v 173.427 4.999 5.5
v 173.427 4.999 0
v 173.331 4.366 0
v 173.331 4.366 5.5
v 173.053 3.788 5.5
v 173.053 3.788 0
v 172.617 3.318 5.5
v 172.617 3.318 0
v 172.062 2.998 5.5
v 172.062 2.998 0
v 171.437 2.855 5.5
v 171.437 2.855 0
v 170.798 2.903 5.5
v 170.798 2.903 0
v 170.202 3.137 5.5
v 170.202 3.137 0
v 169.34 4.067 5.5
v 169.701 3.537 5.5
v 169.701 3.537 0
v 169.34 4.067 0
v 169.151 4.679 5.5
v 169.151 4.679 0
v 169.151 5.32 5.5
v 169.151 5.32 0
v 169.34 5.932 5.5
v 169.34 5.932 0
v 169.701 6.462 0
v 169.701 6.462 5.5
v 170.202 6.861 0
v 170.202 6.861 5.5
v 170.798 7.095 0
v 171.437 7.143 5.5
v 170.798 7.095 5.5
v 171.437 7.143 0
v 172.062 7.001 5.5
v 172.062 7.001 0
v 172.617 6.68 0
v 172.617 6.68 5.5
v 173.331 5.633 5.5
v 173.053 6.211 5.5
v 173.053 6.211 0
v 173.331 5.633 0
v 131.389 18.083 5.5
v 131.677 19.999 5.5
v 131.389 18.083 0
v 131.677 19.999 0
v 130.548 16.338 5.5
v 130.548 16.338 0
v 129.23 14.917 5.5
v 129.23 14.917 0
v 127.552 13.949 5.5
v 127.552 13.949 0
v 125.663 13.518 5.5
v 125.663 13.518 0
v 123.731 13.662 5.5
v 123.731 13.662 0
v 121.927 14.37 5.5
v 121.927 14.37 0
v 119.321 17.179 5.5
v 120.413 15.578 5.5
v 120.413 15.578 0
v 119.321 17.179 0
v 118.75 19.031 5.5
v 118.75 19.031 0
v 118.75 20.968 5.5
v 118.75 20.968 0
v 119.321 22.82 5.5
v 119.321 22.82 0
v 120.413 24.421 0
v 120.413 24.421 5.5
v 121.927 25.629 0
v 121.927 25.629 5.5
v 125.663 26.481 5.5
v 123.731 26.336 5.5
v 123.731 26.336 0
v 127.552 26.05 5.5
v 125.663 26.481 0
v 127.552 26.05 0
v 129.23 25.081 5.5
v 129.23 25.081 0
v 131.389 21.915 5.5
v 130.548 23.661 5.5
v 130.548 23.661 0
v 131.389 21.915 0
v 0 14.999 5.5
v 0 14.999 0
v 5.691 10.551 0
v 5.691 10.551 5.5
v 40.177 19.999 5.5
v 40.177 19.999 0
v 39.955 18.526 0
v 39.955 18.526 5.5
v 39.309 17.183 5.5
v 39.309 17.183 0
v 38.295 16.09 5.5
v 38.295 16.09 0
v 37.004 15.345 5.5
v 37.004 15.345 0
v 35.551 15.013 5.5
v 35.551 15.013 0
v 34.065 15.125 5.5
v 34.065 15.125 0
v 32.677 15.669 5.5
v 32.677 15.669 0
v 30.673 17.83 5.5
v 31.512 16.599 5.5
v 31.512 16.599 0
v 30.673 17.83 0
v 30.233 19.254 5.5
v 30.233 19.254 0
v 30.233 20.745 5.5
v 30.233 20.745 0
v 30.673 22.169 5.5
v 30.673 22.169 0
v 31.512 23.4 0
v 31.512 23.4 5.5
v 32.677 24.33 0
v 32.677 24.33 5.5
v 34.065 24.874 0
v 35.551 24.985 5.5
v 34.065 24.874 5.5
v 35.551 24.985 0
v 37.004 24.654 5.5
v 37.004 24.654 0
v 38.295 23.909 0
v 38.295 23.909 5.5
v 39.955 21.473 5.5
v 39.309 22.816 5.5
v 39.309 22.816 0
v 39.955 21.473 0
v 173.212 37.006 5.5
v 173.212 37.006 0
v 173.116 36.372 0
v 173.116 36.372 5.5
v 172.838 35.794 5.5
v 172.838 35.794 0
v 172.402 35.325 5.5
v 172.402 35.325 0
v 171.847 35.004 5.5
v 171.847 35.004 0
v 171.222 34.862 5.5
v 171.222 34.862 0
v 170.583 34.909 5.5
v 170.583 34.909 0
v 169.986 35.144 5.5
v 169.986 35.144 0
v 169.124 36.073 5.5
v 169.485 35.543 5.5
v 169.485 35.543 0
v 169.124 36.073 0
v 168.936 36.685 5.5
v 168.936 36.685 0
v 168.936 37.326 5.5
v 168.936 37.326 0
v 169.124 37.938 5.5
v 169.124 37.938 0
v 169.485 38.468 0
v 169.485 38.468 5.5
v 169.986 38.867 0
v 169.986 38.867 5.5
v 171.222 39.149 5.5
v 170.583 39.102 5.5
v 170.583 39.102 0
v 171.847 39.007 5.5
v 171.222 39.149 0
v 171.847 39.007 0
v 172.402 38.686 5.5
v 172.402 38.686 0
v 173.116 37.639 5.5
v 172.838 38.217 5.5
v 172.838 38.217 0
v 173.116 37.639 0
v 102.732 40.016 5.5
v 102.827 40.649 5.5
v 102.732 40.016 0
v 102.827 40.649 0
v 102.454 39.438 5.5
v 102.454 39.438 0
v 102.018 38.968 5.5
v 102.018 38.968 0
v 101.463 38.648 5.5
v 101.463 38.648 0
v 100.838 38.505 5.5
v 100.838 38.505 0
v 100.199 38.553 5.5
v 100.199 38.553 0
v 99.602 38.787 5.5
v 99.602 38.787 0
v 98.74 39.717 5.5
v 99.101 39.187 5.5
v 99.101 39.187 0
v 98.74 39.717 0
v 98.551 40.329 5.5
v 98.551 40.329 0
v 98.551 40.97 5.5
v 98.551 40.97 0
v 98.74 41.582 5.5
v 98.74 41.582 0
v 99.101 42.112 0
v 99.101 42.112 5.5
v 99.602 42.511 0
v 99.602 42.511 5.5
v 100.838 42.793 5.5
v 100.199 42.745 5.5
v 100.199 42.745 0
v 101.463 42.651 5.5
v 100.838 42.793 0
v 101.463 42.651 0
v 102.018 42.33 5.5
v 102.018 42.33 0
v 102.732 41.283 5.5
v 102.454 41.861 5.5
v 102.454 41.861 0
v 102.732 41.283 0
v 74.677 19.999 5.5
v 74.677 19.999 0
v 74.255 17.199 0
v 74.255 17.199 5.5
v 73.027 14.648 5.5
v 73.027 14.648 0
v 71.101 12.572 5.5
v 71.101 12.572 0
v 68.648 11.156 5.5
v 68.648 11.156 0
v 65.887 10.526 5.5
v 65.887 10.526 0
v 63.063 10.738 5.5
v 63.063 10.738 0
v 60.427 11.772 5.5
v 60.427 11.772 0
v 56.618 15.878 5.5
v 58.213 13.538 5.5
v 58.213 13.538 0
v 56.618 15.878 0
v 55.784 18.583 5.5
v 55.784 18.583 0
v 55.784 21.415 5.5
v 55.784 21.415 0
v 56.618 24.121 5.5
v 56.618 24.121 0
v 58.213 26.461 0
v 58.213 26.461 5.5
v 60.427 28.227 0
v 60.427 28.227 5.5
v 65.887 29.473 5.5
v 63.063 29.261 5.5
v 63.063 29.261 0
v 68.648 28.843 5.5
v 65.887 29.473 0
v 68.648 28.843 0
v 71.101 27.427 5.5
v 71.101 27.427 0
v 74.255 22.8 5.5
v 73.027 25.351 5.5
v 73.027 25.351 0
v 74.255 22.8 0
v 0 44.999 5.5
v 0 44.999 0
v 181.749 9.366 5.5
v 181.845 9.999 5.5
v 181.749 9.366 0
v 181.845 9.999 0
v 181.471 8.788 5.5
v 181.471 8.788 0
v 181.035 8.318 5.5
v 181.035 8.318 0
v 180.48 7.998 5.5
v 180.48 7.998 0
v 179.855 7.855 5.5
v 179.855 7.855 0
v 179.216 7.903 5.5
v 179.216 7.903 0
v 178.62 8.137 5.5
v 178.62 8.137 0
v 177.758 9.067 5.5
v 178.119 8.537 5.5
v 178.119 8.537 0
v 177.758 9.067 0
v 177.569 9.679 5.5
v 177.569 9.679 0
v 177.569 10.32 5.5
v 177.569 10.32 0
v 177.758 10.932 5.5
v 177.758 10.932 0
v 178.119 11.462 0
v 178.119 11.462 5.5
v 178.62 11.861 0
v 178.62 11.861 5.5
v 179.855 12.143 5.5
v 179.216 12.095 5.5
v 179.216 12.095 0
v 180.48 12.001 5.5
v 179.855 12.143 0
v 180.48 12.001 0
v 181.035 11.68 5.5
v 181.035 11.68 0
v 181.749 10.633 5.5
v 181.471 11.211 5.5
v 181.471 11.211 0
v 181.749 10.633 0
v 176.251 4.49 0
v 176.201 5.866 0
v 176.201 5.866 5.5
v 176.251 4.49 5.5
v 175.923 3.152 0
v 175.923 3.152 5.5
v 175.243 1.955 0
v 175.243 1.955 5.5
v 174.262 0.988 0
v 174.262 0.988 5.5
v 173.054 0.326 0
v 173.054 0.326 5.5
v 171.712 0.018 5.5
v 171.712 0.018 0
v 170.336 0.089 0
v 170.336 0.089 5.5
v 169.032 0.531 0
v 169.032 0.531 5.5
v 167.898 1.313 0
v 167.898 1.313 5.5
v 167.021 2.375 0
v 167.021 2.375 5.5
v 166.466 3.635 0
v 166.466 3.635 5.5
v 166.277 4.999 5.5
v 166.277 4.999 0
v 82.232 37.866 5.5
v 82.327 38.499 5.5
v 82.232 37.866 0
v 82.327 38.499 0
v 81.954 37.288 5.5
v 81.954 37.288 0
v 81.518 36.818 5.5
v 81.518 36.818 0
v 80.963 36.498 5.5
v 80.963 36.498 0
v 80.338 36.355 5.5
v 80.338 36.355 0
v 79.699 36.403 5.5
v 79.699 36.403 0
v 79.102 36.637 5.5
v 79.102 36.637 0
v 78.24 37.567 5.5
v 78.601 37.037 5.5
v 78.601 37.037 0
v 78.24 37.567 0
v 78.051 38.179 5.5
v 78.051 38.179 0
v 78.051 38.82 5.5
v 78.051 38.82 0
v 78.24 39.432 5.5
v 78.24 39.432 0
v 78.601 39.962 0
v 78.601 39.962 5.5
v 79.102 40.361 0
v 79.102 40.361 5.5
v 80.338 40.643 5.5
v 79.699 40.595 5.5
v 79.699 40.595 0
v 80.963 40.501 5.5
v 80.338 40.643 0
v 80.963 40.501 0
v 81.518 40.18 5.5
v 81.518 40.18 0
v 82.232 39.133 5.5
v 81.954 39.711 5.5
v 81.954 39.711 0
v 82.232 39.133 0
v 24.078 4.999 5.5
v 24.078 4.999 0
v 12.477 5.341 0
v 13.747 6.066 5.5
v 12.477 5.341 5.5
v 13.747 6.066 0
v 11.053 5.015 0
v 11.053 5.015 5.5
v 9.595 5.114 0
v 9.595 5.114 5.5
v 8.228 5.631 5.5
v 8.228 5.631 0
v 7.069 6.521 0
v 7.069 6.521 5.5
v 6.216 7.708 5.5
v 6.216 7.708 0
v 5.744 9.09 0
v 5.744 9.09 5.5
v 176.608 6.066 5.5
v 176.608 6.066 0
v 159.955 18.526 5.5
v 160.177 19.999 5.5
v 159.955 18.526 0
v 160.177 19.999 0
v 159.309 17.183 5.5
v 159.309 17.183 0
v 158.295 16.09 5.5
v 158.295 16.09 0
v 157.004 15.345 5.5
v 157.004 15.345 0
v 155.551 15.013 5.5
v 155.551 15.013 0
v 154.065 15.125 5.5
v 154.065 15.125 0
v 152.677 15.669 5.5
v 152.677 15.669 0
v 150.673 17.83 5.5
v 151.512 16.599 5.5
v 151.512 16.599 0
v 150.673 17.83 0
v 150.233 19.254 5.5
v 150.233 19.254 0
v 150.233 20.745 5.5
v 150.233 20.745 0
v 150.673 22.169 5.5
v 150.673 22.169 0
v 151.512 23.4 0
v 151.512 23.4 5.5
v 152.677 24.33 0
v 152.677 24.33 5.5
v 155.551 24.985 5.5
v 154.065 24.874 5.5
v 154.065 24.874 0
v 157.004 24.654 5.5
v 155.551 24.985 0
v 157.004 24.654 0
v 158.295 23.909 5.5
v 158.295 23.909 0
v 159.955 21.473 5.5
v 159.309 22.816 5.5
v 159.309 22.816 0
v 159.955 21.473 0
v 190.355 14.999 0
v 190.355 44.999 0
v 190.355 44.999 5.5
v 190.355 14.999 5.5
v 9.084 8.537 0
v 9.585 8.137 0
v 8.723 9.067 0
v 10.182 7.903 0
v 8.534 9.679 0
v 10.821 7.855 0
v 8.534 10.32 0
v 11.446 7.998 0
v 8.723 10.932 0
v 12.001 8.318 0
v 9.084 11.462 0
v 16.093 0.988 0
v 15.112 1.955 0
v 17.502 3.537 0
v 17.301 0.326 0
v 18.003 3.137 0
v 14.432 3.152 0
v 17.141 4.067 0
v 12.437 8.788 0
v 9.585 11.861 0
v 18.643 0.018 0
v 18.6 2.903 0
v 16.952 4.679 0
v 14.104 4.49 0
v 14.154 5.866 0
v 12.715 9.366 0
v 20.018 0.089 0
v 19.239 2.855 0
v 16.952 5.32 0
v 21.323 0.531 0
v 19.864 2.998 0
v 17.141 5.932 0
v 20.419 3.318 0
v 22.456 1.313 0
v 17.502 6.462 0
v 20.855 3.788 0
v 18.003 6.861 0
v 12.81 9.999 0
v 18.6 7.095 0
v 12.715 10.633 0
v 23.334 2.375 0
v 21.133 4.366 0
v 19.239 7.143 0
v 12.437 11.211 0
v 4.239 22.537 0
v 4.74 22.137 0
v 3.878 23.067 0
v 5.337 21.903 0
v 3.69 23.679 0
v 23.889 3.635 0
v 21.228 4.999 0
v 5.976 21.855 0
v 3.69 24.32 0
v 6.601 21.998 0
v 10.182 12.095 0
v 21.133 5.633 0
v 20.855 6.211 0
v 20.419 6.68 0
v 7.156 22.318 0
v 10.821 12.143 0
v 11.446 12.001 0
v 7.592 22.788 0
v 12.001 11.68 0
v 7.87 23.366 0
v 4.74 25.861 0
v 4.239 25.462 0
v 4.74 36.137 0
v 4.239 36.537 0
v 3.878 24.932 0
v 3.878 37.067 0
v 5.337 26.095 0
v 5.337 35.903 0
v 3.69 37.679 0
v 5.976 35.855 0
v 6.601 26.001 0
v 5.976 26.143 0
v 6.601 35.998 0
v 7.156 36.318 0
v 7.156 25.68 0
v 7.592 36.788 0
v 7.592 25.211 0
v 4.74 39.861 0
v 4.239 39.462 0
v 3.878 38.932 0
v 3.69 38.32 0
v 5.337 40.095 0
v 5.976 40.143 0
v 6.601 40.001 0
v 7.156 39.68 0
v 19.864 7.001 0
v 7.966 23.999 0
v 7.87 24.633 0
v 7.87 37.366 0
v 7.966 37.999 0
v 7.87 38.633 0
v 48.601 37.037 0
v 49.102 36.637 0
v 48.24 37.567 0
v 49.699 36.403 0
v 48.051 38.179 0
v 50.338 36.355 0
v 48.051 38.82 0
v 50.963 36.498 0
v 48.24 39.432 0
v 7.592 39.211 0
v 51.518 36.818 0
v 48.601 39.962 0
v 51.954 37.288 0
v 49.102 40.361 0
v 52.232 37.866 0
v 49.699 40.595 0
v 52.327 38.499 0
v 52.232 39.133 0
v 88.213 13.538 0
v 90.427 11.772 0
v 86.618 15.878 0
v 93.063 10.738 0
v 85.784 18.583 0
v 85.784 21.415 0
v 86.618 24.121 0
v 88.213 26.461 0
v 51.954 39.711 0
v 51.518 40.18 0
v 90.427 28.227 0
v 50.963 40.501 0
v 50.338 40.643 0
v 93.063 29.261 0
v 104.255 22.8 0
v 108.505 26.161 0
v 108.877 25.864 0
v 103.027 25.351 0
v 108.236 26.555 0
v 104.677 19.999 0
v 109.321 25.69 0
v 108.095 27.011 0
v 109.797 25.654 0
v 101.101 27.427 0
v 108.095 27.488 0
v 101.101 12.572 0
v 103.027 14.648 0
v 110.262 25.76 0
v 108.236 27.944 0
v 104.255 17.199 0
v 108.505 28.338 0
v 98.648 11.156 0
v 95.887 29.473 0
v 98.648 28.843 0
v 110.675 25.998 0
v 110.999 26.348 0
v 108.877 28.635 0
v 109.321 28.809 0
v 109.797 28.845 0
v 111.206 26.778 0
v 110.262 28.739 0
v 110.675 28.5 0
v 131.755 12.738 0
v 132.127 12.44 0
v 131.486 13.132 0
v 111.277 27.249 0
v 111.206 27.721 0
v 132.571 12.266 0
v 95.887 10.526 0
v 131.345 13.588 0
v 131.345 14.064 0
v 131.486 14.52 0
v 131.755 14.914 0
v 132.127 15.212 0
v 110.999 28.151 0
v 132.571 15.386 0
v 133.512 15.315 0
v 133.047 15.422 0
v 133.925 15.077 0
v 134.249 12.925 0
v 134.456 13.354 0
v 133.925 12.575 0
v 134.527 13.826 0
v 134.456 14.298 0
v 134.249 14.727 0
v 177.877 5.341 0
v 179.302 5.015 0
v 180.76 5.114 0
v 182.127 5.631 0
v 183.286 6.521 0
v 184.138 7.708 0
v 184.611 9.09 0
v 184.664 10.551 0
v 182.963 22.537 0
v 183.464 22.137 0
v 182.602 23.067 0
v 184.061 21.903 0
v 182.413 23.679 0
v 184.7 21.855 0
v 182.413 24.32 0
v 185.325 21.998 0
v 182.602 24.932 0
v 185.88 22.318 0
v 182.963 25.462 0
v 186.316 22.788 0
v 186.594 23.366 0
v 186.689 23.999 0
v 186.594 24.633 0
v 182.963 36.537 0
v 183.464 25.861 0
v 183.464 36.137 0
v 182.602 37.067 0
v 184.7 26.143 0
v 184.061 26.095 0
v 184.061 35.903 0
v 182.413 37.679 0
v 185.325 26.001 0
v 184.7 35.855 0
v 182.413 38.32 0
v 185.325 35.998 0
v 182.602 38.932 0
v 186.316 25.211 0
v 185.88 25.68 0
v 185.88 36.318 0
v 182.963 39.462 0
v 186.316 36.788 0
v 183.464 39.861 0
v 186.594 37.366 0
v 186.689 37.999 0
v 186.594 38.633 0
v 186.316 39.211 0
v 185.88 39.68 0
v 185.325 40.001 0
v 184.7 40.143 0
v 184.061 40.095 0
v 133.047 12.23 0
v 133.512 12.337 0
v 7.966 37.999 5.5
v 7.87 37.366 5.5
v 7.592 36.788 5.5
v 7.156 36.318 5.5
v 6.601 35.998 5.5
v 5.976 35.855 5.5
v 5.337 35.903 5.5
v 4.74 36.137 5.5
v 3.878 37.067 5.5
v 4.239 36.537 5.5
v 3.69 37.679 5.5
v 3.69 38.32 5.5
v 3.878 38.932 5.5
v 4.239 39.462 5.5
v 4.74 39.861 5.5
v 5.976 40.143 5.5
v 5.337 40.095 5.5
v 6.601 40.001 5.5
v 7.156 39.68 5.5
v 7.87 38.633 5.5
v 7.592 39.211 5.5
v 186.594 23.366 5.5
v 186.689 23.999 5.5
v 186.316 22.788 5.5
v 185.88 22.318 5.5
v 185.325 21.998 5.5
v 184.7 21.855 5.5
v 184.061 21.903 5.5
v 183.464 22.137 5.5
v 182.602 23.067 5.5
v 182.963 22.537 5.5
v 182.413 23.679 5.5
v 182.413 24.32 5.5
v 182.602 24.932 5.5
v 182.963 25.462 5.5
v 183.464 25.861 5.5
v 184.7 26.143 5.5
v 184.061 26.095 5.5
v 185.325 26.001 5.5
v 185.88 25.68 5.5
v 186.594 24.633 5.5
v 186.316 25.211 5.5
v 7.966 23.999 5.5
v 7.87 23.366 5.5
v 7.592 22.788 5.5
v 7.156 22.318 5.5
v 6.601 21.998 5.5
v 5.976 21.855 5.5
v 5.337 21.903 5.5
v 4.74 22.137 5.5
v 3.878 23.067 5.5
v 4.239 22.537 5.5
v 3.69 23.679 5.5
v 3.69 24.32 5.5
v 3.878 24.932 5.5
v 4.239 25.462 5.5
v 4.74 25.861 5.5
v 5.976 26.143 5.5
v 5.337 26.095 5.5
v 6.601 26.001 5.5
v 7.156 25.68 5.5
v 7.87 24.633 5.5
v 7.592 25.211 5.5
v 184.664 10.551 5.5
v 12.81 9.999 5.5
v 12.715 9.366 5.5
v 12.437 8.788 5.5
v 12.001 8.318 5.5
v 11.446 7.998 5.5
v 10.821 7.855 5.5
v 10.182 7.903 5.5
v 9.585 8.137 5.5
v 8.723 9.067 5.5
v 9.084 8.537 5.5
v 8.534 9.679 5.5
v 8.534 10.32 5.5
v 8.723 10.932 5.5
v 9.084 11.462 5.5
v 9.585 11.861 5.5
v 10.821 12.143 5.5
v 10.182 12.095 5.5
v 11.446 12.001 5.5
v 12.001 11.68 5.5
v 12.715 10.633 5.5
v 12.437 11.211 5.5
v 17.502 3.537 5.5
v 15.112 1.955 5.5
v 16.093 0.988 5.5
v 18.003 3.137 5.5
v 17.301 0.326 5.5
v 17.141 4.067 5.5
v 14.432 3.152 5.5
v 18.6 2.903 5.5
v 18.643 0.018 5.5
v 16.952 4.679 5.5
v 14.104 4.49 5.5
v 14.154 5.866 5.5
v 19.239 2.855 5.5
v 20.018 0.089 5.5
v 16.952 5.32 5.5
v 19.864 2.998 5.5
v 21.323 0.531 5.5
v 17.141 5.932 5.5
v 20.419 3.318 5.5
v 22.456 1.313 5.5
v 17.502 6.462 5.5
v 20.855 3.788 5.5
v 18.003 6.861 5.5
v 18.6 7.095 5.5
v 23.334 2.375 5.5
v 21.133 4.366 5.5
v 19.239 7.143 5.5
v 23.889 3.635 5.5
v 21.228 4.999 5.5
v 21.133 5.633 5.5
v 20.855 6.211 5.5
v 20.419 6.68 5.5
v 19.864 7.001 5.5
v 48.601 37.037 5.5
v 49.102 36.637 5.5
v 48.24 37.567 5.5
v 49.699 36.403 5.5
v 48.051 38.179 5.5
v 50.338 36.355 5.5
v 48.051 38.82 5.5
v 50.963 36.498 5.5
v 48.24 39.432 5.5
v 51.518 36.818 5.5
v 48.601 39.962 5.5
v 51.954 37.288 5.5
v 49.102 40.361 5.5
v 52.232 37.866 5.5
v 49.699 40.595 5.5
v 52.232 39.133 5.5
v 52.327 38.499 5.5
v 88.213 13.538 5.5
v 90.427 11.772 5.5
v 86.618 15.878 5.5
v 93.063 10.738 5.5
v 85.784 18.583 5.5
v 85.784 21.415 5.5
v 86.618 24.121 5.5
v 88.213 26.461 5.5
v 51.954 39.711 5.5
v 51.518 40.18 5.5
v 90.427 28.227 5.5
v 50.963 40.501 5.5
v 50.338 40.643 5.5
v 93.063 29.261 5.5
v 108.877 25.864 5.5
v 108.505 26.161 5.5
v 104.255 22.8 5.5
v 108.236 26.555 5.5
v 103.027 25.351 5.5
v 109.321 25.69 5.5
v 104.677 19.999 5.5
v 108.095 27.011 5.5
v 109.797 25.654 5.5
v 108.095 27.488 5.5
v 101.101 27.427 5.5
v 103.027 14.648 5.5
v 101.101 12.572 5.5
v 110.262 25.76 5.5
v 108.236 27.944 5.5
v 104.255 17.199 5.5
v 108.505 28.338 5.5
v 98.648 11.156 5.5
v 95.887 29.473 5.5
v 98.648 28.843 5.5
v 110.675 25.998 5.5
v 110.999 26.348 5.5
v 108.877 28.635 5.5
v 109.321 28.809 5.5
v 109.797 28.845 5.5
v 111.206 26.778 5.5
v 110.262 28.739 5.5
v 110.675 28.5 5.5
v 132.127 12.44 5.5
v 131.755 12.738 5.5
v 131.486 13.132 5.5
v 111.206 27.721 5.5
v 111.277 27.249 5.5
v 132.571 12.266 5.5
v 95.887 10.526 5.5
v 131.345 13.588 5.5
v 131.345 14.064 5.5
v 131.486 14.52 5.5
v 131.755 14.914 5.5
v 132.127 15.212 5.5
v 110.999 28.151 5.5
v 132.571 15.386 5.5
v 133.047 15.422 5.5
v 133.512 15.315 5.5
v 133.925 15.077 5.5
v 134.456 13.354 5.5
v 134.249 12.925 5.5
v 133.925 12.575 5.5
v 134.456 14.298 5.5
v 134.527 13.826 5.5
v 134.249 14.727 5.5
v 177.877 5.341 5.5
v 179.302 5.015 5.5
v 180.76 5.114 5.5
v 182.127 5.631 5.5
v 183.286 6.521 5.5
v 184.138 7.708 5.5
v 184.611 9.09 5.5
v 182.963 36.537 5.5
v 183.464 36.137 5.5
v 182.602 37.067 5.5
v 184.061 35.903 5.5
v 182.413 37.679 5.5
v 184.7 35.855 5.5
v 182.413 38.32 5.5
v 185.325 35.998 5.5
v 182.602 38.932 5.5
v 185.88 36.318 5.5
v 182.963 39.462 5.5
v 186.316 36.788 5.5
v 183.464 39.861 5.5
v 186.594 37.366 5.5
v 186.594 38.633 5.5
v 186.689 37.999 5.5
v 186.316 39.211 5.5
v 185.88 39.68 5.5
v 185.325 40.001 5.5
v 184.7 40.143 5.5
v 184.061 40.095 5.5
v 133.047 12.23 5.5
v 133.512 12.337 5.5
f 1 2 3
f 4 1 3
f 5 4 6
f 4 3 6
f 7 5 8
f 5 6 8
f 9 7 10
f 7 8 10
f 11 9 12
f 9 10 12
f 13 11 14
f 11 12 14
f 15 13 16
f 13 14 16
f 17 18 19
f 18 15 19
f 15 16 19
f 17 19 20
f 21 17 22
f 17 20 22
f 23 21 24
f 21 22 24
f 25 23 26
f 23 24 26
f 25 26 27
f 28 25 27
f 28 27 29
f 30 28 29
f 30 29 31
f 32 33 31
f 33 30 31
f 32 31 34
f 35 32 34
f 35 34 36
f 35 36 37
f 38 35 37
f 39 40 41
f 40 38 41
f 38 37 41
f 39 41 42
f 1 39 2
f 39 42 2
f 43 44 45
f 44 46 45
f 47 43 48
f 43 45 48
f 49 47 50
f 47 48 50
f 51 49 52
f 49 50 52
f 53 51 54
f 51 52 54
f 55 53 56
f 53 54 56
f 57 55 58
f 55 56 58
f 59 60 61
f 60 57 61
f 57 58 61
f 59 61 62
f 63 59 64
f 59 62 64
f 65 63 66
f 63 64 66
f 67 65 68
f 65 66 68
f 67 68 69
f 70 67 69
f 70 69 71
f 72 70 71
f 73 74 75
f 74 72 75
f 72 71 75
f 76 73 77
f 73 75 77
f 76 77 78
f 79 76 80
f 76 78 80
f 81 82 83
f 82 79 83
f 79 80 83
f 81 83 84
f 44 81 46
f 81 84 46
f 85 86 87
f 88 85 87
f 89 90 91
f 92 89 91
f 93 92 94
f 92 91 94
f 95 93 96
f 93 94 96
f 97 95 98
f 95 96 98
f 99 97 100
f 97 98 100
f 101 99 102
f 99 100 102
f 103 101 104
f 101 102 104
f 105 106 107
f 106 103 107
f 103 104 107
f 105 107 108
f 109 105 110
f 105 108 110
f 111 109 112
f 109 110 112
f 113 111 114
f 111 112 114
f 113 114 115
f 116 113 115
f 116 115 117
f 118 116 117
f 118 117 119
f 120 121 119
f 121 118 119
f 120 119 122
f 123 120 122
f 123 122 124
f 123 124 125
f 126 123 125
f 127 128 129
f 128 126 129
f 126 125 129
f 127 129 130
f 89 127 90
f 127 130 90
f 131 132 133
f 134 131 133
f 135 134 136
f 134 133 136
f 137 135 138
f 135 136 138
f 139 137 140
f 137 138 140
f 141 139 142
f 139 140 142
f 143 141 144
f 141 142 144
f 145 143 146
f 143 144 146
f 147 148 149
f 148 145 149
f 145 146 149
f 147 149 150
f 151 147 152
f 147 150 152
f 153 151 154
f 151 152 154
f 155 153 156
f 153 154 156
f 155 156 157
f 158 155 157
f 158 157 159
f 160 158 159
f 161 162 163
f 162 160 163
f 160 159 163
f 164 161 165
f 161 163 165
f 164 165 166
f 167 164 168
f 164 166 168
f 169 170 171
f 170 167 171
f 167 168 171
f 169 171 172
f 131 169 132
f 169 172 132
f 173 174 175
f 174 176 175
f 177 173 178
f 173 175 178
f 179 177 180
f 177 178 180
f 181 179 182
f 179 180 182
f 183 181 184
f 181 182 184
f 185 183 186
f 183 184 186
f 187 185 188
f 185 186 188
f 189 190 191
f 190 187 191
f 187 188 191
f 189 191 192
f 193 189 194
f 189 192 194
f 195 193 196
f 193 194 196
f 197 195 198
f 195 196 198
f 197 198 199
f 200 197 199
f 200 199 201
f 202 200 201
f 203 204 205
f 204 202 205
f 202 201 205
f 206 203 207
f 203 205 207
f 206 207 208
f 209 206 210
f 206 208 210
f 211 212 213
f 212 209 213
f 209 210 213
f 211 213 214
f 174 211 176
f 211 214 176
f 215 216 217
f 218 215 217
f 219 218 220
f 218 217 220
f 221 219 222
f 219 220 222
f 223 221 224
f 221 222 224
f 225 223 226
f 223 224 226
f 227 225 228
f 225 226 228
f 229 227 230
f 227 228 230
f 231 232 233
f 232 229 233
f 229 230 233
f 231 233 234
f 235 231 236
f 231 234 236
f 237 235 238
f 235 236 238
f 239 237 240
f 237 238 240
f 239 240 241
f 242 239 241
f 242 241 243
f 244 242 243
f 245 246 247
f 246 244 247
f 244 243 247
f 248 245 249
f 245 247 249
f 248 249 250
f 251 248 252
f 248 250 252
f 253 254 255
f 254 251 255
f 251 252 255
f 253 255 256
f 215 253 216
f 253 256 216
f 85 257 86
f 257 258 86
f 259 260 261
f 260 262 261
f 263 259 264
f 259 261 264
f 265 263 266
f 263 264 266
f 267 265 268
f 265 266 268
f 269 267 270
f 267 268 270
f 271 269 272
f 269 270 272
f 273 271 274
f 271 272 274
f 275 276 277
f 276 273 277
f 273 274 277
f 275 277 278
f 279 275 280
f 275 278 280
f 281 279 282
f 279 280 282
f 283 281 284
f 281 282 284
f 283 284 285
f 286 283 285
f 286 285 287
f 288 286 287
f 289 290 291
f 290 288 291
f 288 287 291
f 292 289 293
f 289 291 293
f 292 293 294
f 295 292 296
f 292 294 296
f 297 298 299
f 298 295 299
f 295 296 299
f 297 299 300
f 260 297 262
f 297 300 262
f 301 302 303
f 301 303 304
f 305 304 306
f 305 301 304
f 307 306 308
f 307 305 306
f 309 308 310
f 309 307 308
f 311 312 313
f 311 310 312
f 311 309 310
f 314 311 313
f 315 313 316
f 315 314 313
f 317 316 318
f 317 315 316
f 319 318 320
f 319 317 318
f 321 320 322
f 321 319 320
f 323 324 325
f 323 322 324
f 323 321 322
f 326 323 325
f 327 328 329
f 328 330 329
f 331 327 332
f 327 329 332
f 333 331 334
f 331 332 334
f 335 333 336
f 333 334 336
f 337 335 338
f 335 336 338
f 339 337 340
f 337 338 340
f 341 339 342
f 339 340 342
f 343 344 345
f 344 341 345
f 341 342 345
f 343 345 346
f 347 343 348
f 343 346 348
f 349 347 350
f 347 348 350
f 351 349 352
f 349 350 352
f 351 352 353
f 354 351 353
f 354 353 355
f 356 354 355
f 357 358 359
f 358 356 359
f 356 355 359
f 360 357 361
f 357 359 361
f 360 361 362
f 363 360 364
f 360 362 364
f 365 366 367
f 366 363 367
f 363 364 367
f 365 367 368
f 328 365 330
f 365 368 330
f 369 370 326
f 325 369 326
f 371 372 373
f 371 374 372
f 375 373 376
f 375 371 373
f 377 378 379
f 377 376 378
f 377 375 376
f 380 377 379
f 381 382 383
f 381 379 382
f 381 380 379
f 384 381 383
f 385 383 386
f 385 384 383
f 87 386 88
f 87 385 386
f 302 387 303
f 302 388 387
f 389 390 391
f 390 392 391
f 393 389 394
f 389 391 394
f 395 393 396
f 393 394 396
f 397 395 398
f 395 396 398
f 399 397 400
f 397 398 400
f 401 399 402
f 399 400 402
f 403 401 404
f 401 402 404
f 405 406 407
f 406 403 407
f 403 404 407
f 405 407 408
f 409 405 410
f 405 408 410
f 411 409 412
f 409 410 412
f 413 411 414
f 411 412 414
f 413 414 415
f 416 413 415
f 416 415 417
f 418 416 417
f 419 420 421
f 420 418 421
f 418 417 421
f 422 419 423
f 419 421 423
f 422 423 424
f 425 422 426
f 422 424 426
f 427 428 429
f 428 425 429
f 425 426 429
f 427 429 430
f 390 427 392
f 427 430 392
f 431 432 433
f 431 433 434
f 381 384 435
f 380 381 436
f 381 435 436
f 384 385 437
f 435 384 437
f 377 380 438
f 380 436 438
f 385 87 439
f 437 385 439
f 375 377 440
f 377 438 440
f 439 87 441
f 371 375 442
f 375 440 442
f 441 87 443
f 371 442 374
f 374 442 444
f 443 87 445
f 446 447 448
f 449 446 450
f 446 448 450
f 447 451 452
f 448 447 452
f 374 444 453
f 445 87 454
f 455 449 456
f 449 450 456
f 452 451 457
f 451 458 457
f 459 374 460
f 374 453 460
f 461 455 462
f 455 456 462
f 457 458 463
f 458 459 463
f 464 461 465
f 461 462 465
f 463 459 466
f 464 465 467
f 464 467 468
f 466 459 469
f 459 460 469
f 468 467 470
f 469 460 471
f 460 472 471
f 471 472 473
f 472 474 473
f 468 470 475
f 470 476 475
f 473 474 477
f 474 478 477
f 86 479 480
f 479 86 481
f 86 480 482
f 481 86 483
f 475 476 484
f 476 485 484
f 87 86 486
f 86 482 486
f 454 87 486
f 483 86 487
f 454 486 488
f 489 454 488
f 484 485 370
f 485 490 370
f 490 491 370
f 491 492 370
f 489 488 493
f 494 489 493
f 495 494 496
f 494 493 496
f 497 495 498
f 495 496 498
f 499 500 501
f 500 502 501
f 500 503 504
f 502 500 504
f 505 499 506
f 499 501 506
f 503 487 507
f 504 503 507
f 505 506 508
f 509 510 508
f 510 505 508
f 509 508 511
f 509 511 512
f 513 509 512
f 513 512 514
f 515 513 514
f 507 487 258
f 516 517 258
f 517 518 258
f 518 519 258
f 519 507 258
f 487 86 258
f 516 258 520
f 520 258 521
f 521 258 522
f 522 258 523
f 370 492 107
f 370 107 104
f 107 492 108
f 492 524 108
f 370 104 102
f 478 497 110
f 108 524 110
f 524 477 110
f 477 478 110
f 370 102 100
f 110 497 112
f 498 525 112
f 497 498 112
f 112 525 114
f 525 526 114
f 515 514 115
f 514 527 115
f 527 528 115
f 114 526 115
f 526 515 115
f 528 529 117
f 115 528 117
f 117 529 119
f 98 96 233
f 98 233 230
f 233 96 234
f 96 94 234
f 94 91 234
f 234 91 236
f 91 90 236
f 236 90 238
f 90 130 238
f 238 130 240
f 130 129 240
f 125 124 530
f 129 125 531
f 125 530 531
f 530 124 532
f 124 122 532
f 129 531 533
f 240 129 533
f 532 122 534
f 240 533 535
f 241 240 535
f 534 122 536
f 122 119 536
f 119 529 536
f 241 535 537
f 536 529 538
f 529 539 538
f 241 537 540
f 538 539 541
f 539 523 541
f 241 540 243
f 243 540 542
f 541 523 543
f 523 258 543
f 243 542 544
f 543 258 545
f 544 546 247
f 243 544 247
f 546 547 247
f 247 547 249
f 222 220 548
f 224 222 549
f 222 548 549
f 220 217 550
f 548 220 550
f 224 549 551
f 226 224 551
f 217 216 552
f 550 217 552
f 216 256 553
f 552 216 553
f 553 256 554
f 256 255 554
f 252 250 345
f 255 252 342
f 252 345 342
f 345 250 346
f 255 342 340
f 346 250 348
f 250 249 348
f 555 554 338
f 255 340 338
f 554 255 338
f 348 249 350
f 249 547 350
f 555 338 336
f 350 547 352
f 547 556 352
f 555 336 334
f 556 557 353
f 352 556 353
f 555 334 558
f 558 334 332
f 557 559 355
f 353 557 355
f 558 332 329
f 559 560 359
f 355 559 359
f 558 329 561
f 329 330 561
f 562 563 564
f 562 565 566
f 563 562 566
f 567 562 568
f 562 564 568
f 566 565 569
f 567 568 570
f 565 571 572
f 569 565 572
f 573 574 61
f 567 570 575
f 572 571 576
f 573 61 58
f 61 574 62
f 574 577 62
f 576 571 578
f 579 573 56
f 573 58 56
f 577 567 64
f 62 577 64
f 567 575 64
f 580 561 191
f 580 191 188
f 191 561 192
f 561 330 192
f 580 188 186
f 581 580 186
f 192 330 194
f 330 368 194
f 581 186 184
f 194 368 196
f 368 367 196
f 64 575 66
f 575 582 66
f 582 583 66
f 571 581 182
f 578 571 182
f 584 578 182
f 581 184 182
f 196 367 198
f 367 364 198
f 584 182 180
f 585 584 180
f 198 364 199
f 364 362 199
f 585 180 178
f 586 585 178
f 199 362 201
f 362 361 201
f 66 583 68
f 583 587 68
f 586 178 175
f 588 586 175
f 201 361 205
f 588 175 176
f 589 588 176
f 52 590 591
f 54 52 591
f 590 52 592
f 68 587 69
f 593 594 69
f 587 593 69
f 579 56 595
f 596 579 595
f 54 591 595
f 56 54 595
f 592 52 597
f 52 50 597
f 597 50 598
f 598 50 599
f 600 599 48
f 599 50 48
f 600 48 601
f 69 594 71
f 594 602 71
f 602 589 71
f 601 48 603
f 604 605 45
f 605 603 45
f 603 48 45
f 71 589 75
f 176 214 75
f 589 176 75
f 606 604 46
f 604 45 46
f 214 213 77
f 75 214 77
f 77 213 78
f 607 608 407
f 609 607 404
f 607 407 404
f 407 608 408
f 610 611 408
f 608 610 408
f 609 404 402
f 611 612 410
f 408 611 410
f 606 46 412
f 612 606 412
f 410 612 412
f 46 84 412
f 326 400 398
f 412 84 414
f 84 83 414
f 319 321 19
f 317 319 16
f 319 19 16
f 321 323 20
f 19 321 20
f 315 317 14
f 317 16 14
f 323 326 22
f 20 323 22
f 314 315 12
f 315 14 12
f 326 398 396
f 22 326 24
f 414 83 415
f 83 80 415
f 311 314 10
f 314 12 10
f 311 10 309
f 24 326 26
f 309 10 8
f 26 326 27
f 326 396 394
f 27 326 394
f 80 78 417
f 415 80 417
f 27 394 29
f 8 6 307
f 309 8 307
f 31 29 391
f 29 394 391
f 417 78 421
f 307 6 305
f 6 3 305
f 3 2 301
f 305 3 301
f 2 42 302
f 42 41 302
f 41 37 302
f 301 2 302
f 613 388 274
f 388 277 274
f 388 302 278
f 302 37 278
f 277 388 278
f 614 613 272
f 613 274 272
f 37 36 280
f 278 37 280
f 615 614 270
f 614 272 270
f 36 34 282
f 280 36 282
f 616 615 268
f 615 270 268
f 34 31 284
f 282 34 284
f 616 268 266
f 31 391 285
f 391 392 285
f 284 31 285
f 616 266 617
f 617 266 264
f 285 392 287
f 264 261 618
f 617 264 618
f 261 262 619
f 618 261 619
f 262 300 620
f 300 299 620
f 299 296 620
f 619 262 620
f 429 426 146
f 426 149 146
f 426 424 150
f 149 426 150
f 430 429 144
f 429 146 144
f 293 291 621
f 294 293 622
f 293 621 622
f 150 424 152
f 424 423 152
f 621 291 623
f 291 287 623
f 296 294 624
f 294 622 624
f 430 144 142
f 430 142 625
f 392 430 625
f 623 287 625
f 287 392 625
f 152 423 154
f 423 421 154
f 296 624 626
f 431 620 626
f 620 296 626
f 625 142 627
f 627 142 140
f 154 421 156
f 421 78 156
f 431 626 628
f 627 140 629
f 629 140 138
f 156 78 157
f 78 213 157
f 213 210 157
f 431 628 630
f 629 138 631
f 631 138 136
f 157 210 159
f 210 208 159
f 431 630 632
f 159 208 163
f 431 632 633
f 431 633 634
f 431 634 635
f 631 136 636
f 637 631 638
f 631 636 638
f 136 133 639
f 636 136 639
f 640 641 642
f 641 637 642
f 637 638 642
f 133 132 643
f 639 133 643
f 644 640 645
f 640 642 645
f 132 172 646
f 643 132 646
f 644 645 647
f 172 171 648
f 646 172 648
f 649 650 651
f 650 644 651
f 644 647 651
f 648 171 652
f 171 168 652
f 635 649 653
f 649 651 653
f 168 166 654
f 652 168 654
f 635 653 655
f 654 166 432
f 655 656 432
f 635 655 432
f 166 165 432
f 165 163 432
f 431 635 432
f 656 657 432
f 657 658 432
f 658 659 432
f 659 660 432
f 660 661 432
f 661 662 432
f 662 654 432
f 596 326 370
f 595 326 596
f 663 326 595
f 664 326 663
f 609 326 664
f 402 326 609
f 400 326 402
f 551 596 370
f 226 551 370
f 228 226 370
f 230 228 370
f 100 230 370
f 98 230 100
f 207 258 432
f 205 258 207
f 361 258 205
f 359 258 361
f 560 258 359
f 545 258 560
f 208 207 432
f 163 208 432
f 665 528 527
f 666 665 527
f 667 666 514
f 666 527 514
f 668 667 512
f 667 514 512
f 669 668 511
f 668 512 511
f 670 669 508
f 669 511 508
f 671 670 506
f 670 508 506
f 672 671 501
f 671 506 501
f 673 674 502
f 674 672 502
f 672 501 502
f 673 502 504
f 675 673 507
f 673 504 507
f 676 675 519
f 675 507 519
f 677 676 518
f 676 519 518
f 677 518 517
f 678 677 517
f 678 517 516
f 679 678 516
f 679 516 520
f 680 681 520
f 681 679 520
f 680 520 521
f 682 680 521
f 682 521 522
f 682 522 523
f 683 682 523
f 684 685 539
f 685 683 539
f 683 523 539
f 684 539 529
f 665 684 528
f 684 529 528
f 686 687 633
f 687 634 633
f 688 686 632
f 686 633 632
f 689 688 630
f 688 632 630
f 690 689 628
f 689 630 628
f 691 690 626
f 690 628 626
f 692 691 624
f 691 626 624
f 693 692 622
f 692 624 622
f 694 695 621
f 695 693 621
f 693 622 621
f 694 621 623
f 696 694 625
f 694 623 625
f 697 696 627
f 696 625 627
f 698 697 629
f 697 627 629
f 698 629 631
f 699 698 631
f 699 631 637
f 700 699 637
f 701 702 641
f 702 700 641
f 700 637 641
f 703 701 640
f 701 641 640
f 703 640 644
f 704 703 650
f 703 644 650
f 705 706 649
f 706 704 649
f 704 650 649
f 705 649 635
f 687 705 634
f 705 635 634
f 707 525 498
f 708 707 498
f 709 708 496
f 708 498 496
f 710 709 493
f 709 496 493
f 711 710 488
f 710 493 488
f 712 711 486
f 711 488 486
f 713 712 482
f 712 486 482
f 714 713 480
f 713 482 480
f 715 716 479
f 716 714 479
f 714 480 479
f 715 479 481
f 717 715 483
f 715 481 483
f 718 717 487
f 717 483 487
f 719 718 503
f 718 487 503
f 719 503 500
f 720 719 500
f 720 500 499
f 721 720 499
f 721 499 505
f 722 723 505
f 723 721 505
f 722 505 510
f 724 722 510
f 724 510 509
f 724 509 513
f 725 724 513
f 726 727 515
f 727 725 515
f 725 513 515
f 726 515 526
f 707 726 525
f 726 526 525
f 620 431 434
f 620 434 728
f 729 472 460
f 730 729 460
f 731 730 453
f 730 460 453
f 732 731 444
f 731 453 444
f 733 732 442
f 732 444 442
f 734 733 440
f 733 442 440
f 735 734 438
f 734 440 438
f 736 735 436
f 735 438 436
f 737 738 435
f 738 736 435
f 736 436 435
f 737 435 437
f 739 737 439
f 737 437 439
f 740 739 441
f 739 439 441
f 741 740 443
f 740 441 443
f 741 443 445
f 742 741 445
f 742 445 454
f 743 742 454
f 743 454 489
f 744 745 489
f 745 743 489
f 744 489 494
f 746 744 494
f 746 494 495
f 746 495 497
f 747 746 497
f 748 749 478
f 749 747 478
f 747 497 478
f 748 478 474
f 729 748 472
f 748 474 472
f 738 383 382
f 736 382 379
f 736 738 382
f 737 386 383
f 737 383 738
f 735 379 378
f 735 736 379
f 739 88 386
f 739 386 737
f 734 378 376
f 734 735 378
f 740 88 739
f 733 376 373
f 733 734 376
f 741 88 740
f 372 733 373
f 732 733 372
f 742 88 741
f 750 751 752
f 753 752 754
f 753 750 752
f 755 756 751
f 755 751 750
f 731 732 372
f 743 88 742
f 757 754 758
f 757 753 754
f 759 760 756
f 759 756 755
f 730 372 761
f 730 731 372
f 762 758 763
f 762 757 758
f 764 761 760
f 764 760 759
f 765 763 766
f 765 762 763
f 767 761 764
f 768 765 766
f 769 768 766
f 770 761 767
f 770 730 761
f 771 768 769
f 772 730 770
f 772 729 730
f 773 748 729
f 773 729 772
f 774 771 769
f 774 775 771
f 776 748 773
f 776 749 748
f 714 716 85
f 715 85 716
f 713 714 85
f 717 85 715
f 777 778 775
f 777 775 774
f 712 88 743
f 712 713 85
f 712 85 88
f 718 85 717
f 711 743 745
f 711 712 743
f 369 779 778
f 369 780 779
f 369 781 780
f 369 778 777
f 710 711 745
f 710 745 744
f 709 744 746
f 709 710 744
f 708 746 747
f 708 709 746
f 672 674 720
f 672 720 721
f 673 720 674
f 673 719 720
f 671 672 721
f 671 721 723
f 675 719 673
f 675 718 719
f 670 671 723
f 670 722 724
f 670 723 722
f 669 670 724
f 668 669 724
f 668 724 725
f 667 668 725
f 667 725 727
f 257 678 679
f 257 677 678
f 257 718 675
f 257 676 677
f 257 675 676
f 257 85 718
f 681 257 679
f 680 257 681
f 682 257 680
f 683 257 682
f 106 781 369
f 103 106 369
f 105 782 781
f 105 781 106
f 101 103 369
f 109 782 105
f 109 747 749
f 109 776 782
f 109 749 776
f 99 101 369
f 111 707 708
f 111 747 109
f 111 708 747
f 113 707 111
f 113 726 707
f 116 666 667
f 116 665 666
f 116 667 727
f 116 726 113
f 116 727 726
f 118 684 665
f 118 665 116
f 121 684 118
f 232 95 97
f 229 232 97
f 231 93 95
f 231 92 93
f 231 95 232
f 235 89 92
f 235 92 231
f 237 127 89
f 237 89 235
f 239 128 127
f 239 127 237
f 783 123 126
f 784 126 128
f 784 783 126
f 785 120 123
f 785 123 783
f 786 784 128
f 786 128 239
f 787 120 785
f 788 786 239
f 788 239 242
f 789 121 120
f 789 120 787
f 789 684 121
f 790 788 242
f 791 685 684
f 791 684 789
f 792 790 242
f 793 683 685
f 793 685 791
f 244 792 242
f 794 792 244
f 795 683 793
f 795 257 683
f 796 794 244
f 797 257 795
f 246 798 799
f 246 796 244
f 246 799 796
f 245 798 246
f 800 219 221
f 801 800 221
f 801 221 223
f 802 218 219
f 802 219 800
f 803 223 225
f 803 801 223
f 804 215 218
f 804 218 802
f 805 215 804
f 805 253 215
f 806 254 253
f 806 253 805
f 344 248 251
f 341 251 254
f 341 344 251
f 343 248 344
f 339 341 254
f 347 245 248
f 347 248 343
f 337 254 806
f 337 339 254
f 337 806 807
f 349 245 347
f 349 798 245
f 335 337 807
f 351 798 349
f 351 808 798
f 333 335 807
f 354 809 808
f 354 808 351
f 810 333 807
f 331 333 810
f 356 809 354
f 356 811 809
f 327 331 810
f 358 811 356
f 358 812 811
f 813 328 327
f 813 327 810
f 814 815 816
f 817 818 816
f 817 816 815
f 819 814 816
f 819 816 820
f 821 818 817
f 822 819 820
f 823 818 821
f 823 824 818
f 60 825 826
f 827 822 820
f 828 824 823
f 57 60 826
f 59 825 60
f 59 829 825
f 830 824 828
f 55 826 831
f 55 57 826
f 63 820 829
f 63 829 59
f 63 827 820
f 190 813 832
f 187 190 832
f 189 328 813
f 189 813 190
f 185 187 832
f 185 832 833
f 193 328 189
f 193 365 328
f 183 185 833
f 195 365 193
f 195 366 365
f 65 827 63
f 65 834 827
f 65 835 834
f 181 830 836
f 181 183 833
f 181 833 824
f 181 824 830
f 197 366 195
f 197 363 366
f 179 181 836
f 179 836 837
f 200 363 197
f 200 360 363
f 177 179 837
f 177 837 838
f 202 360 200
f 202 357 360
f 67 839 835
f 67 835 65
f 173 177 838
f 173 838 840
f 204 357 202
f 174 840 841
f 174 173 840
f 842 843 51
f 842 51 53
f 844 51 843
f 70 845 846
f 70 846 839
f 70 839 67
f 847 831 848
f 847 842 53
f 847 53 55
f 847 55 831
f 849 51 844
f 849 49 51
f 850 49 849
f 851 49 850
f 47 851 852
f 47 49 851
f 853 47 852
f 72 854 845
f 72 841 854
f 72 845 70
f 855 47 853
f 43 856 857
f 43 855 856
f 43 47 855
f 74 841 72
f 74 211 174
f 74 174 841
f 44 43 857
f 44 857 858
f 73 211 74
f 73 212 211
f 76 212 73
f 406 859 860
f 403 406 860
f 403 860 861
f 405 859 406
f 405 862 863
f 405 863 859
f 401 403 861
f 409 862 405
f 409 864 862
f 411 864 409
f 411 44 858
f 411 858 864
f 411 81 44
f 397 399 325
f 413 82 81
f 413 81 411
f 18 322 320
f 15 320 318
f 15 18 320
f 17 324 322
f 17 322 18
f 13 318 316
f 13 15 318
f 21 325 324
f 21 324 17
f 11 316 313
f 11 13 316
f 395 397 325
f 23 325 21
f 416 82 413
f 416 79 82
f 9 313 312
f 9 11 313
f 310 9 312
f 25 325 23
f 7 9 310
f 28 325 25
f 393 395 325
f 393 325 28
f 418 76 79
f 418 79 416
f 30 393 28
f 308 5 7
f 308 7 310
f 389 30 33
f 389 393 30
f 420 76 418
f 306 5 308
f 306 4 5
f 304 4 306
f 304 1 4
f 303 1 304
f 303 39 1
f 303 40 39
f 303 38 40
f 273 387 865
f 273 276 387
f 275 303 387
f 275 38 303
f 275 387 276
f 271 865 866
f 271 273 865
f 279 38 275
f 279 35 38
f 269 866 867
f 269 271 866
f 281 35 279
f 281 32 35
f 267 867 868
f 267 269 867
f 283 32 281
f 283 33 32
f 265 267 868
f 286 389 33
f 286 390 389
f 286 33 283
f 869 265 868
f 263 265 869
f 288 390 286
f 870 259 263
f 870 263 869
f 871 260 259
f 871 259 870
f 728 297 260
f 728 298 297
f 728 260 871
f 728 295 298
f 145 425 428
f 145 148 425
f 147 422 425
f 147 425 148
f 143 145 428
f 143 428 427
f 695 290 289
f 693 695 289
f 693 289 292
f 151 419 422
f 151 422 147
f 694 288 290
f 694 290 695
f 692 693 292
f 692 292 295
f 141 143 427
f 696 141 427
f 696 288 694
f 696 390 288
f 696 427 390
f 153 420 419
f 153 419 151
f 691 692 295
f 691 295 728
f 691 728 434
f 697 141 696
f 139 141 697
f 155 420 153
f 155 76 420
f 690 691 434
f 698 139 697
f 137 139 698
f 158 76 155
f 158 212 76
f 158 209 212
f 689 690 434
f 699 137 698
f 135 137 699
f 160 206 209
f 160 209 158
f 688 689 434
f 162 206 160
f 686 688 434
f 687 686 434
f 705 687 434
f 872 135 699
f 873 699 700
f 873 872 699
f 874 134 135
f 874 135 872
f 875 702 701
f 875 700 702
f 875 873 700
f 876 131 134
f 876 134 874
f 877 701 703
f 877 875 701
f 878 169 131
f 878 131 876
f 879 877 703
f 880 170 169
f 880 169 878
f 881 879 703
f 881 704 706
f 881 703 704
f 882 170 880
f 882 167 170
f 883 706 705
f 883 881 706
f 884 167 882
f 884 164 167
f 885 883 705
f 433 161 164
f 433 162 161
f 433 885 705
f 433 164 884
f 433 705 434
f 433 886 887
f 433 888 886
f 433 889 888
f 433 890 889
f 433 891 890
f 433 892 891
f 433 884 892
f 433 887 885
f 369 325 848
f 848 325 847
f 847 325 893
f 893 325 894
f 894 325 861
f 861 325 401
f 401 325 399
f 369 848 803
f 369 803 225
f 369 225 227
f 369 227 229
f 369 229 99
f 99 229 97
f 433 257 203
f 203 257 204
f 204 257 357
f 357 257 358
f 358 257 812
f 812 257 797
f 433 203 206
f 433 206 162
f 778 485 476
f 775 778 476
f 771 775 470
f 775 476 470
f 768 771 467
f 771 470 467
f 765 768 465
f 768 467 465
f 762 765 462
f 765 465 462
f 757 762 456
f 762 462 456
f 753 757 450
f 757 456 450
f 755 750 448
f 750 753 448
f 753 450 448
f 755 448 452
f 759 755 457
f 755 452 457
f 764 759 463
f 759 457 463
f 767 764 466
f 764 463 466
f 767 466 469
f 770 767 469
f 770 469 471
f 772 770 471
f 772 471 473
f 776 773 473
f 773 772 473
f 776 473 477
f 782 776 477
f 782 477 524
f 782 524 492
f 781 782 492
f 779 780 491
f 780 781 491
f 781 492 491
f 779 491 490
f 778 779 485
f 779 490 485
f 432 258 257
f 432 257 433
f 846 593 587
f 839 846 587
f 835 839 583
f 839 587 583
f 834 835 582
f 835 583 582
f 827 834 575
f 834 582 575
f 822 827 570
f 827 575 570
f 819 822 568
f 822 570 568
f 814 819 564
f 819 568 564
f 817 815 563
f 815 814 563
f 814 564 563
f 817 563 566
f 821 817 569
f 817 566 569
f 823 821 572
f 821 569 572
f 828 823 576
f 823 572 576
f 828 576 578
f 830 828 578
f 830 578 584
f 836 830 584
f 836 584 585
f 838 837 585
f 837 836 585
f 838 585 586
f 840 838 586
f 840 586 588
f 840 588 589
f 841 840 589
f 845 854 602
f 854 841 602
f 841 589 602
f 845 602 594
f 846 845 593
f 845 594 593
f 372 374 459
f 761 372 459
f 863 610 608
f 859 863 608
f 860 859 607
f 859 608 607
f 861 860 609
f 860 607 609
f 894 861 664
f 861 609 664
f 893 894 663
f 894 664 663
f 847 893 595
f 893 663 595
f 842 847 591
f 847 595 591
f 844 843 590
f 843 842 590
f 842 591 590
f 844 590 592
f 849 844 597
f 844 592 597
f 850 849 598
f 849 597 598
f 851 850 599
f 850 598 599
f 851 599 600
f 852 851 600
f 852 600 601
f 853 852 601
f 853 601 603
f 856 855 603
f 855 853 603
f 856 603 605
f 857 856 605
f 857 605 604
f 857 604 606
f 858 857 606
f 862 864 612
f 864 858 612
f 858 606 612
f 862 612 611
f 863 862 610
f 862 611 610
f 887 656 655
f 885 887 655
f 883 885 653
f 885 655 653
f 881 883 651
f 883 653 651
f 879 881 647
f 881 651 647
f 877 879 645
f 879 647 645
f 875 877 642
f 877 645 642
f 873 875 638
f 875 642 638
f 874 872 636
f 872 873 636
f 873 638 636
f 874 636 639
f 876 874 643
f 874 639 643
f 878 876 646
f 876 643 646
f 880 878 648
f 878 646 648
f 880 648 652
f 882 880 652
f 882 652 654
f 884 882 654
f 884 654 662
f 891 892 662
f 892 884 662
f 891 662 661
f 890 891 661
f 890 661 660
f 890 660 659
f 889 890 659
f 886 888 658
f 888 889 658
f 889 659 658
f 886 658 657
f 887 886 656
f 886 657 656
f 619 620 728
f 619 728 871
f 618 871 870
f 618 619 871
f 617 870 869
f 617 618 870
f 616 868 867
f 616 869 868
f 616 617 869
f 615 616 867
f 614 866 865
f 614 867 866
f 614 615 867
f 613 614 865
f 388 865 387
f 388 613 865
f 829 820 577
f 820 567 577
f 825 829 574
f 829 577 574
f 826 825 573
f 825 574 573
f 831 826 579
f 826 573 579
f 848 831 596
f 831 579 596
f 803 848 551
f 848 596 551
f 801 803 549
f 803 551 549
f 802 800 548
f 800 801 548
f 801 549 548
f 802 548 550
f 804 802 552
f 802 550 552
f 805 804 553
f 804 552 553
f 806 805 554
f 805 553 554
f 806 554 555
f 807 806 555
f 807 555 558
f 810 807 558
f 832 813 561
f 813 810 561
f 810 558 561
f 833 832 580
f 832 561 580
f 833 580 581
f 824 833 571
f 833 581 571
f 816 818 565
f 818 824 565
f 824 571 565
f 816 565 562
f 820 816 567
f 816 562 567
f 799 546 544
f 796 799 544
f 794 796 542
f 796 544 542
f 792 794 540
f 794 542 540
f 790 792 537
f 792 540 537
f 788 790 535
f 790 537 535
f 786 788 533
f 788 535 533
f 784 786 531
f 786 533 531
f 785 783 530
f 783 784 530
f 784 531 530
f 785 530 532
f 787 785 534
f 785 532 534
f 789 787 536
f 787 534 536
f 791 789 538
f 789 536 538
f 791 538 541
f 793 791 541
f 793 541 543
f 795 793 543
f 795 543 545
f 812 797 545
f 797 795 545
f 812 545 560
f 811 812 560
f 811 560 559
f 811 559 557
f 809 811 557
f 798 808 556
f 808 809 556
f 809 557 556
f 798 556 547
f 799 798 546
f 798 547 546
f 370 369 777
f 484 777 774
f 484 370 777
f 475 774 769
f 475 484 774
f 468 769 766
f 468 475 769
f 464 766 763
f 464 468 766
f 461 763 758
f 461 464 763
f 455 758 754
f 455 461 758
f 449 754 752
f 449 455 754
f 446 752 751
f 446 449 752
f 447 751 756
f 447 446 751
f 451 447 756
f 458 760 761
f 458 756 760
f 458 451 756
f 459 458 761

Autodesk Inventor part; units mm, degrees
ref_plane "YZ Plane" through (0, 0, 0) normal (1, 0, 0) x (0, 1, 0)
ref_plane "XZ Plane" through (0, 0, 0) normal (0, 1, 0) x (-1, 0, 0)
ref_plane "XY Plane" through (0, 0, 0) normal (0, 0, 1) x (1, 0, 0)
sketch "スケッチ1" plane through (0, 0, 0) normal (0, 0, 1) x (1, 0, 0)
  circle A0 centre (10.6603, 9.9994) radius 2.15
  circle A1 centre (179.6946, 9.9994) radius 2.15
  circle A2 centre (100.6774, 40.6494) radius 2.15
  circle A3 centre (80.1774, 38.4994) radius 2.15
  circle A4 centre (50.1774, 38.4994) radius 2.15
  circle A5 centre (19.0782, 4.9994) radius 2.15
  circle A6 centre (171.2766, 4.9994) radius 2.15
  circle A7 centre (171.0615, 37.0055) radius 2.15
  circle A8 centre (5.8155, 23.9994) radius 2.15
  circle A9 centre (5.8155, 37.9994) radius 2.15
  circle A10 centre (184.5394, 23.9994) radius 2.15
  circle A11 centre (184.5394, 37.9994) radius 2.15
  circle A12 centre (155.1774, 19.9994) radius 5
  circle A13 centre (95.1774, 19.9994) radius 9.5
  circle A14 centre (65.1774, 19.9994) radius 9.5
  circle A15 centre (35.1774, 19.9994) radius 5
  circle A16 centre (132.9274, 13.826) radius 1.6
  circle A17 centre (109.6774, 27.2494) radius 1.6
  line L0 (105.6774, 48.2494) -> (144.6774, 48.2494)
  line L1 (144.6774, 48.2494) -> (144.6774, 27.2494)
  arc A18 (105.6774, 27.2494) -> (144.6774, 27.2494) centre (125.1774, 27.2494) ccw
  line L2 (105.6774, 27.2494) -> (105.6774, 48.2494)
  circle A19 centre (125.1774, 19.9994) radius 6.5
  line L3 (0, 44.9994) -> (0, 14.9994)
  line L4 (0, 14.9994) -> (5.6908, 10.5508)
  arc A20 (5.6908, 10.5508) -> (13.7466, 6.0657) centre (10.6603, 9.9994) ccw
  line L5 (13.7466, 6.0657) -> (14.154, 5.8665)
  arc A21 (14.154, 5.8665) -> (24.0782, 4.9994) centre (19.0782, 4.9994) ccw
  line L6 (190.3548, 44.9994) -> (190.3548, 14.9994)
  line L7 (190.3548, 14.9994) -> (184.6641, 10.5508)
  arc A22 (176.6082, 6.0657) -> (184.6641, 10.5508) centre (179.6946, 9.9994) ccw
  line L8 (176.6082, 6.0657) -> (176.2009, 5.8665)
  arc A23 (166.2766, 4.9994) -> (176.2009, 5.8665) centre (171.2766, 4.9994) ccw
  line L9 (24.0782, 4.9994) -> (166.2766, 4.9994)
  line L10 (0, 44.9994) -> (190.3548, 44.9994)
  line L11 (0, 44.9994) -> (190.3548, 44.9994)
  line L12 (190.3548, 44.9994) -> (190.3548, 14.9994)
  line L13 (0, 44.9994) -> (0, 14.9994)
  line L14 (5.6908, 10.5508) -> (0, 14.9994)
  line L15 (24.0782, 4.9994) -> (166.2766, 4.9994)
  line L16 (184.6641, 10.5508) -> (190.3548, 14.9994)
  arc A24 (8.228, 5.6308) -> (13.7466, 6.0657) centre (10.6603, 9.9994) ccw
  line L17 (13.7466, 6.0657) -> (14.154, 5.8665)
  arc A25 (166.2766, 4.9994) -> (176.2009, 5.8665) centre (171.2766, 4.9994) ccw
  arc A26 (176.6082, 6.0657) -> (184.6641, 10.5508) centre (179.6946, 9.9994) ccw
  line L18 (176.6082, 6.0657) -> (176.2009, 5.8665)
  arc A27 (16.5868, 0.6644) -> (24.0782, 4.9994) centre (19.0782, 4.9994) ccw
  circle A28 centre (5.8155, 37.9994) radius 2.15
  circle A29 centre (5.8155, 23.9994) radius 2.15
  circle A30 centre (10.6603, 9.9994) radius 2.15
  circle A31 centre (19.0782, 4.9994) radius 2.15
  circle A32 centre (50.1774, 38.4994) radius 2.15
  circle A33 centre (80.1774, 38.4994) radius 2.15
  circle A34 centre (100.6774, 40.6494) radius 2.15
  circle A35 centre (171.0615, 37.0055) radius 2.15
  circle A36 centre (184.5394, 37.9994) radius 2.15
  circle A37 centre (184.5394, 23.9994) radius 2.15
  circle A38 centre (179.6946, 9.9994) radius 2.15
  circle A39 centre (171.2766, 4.9994) radius 2.15
  circle A40 centre (109.6774, 27.2494) radius 1.6
  circle A41 centre (132.9274, 13.826) radius 1.6
  circle A42 centre (125.1774, 19.9994) radius 6.5
  point P0 (0, 0)
  dimension "d0" = 10
  dimension "d1" = 19
sketch "スケッチ2" plane through (0, 0, 0) normal (0, 0, 1) x (1, 0, 0)
  point P0 (0, 0)
extrude "押し出し1" add sketch "スケッチ1" along normal blind 5.5 contours L10 L1 A18 L2 | L2 A18 L1 L10 L6 L7 A22 L8 A23 L9 A21 L5 A20 L4 L3
properties part number "1枚目" material "MDF 中密度繊維ボード"
